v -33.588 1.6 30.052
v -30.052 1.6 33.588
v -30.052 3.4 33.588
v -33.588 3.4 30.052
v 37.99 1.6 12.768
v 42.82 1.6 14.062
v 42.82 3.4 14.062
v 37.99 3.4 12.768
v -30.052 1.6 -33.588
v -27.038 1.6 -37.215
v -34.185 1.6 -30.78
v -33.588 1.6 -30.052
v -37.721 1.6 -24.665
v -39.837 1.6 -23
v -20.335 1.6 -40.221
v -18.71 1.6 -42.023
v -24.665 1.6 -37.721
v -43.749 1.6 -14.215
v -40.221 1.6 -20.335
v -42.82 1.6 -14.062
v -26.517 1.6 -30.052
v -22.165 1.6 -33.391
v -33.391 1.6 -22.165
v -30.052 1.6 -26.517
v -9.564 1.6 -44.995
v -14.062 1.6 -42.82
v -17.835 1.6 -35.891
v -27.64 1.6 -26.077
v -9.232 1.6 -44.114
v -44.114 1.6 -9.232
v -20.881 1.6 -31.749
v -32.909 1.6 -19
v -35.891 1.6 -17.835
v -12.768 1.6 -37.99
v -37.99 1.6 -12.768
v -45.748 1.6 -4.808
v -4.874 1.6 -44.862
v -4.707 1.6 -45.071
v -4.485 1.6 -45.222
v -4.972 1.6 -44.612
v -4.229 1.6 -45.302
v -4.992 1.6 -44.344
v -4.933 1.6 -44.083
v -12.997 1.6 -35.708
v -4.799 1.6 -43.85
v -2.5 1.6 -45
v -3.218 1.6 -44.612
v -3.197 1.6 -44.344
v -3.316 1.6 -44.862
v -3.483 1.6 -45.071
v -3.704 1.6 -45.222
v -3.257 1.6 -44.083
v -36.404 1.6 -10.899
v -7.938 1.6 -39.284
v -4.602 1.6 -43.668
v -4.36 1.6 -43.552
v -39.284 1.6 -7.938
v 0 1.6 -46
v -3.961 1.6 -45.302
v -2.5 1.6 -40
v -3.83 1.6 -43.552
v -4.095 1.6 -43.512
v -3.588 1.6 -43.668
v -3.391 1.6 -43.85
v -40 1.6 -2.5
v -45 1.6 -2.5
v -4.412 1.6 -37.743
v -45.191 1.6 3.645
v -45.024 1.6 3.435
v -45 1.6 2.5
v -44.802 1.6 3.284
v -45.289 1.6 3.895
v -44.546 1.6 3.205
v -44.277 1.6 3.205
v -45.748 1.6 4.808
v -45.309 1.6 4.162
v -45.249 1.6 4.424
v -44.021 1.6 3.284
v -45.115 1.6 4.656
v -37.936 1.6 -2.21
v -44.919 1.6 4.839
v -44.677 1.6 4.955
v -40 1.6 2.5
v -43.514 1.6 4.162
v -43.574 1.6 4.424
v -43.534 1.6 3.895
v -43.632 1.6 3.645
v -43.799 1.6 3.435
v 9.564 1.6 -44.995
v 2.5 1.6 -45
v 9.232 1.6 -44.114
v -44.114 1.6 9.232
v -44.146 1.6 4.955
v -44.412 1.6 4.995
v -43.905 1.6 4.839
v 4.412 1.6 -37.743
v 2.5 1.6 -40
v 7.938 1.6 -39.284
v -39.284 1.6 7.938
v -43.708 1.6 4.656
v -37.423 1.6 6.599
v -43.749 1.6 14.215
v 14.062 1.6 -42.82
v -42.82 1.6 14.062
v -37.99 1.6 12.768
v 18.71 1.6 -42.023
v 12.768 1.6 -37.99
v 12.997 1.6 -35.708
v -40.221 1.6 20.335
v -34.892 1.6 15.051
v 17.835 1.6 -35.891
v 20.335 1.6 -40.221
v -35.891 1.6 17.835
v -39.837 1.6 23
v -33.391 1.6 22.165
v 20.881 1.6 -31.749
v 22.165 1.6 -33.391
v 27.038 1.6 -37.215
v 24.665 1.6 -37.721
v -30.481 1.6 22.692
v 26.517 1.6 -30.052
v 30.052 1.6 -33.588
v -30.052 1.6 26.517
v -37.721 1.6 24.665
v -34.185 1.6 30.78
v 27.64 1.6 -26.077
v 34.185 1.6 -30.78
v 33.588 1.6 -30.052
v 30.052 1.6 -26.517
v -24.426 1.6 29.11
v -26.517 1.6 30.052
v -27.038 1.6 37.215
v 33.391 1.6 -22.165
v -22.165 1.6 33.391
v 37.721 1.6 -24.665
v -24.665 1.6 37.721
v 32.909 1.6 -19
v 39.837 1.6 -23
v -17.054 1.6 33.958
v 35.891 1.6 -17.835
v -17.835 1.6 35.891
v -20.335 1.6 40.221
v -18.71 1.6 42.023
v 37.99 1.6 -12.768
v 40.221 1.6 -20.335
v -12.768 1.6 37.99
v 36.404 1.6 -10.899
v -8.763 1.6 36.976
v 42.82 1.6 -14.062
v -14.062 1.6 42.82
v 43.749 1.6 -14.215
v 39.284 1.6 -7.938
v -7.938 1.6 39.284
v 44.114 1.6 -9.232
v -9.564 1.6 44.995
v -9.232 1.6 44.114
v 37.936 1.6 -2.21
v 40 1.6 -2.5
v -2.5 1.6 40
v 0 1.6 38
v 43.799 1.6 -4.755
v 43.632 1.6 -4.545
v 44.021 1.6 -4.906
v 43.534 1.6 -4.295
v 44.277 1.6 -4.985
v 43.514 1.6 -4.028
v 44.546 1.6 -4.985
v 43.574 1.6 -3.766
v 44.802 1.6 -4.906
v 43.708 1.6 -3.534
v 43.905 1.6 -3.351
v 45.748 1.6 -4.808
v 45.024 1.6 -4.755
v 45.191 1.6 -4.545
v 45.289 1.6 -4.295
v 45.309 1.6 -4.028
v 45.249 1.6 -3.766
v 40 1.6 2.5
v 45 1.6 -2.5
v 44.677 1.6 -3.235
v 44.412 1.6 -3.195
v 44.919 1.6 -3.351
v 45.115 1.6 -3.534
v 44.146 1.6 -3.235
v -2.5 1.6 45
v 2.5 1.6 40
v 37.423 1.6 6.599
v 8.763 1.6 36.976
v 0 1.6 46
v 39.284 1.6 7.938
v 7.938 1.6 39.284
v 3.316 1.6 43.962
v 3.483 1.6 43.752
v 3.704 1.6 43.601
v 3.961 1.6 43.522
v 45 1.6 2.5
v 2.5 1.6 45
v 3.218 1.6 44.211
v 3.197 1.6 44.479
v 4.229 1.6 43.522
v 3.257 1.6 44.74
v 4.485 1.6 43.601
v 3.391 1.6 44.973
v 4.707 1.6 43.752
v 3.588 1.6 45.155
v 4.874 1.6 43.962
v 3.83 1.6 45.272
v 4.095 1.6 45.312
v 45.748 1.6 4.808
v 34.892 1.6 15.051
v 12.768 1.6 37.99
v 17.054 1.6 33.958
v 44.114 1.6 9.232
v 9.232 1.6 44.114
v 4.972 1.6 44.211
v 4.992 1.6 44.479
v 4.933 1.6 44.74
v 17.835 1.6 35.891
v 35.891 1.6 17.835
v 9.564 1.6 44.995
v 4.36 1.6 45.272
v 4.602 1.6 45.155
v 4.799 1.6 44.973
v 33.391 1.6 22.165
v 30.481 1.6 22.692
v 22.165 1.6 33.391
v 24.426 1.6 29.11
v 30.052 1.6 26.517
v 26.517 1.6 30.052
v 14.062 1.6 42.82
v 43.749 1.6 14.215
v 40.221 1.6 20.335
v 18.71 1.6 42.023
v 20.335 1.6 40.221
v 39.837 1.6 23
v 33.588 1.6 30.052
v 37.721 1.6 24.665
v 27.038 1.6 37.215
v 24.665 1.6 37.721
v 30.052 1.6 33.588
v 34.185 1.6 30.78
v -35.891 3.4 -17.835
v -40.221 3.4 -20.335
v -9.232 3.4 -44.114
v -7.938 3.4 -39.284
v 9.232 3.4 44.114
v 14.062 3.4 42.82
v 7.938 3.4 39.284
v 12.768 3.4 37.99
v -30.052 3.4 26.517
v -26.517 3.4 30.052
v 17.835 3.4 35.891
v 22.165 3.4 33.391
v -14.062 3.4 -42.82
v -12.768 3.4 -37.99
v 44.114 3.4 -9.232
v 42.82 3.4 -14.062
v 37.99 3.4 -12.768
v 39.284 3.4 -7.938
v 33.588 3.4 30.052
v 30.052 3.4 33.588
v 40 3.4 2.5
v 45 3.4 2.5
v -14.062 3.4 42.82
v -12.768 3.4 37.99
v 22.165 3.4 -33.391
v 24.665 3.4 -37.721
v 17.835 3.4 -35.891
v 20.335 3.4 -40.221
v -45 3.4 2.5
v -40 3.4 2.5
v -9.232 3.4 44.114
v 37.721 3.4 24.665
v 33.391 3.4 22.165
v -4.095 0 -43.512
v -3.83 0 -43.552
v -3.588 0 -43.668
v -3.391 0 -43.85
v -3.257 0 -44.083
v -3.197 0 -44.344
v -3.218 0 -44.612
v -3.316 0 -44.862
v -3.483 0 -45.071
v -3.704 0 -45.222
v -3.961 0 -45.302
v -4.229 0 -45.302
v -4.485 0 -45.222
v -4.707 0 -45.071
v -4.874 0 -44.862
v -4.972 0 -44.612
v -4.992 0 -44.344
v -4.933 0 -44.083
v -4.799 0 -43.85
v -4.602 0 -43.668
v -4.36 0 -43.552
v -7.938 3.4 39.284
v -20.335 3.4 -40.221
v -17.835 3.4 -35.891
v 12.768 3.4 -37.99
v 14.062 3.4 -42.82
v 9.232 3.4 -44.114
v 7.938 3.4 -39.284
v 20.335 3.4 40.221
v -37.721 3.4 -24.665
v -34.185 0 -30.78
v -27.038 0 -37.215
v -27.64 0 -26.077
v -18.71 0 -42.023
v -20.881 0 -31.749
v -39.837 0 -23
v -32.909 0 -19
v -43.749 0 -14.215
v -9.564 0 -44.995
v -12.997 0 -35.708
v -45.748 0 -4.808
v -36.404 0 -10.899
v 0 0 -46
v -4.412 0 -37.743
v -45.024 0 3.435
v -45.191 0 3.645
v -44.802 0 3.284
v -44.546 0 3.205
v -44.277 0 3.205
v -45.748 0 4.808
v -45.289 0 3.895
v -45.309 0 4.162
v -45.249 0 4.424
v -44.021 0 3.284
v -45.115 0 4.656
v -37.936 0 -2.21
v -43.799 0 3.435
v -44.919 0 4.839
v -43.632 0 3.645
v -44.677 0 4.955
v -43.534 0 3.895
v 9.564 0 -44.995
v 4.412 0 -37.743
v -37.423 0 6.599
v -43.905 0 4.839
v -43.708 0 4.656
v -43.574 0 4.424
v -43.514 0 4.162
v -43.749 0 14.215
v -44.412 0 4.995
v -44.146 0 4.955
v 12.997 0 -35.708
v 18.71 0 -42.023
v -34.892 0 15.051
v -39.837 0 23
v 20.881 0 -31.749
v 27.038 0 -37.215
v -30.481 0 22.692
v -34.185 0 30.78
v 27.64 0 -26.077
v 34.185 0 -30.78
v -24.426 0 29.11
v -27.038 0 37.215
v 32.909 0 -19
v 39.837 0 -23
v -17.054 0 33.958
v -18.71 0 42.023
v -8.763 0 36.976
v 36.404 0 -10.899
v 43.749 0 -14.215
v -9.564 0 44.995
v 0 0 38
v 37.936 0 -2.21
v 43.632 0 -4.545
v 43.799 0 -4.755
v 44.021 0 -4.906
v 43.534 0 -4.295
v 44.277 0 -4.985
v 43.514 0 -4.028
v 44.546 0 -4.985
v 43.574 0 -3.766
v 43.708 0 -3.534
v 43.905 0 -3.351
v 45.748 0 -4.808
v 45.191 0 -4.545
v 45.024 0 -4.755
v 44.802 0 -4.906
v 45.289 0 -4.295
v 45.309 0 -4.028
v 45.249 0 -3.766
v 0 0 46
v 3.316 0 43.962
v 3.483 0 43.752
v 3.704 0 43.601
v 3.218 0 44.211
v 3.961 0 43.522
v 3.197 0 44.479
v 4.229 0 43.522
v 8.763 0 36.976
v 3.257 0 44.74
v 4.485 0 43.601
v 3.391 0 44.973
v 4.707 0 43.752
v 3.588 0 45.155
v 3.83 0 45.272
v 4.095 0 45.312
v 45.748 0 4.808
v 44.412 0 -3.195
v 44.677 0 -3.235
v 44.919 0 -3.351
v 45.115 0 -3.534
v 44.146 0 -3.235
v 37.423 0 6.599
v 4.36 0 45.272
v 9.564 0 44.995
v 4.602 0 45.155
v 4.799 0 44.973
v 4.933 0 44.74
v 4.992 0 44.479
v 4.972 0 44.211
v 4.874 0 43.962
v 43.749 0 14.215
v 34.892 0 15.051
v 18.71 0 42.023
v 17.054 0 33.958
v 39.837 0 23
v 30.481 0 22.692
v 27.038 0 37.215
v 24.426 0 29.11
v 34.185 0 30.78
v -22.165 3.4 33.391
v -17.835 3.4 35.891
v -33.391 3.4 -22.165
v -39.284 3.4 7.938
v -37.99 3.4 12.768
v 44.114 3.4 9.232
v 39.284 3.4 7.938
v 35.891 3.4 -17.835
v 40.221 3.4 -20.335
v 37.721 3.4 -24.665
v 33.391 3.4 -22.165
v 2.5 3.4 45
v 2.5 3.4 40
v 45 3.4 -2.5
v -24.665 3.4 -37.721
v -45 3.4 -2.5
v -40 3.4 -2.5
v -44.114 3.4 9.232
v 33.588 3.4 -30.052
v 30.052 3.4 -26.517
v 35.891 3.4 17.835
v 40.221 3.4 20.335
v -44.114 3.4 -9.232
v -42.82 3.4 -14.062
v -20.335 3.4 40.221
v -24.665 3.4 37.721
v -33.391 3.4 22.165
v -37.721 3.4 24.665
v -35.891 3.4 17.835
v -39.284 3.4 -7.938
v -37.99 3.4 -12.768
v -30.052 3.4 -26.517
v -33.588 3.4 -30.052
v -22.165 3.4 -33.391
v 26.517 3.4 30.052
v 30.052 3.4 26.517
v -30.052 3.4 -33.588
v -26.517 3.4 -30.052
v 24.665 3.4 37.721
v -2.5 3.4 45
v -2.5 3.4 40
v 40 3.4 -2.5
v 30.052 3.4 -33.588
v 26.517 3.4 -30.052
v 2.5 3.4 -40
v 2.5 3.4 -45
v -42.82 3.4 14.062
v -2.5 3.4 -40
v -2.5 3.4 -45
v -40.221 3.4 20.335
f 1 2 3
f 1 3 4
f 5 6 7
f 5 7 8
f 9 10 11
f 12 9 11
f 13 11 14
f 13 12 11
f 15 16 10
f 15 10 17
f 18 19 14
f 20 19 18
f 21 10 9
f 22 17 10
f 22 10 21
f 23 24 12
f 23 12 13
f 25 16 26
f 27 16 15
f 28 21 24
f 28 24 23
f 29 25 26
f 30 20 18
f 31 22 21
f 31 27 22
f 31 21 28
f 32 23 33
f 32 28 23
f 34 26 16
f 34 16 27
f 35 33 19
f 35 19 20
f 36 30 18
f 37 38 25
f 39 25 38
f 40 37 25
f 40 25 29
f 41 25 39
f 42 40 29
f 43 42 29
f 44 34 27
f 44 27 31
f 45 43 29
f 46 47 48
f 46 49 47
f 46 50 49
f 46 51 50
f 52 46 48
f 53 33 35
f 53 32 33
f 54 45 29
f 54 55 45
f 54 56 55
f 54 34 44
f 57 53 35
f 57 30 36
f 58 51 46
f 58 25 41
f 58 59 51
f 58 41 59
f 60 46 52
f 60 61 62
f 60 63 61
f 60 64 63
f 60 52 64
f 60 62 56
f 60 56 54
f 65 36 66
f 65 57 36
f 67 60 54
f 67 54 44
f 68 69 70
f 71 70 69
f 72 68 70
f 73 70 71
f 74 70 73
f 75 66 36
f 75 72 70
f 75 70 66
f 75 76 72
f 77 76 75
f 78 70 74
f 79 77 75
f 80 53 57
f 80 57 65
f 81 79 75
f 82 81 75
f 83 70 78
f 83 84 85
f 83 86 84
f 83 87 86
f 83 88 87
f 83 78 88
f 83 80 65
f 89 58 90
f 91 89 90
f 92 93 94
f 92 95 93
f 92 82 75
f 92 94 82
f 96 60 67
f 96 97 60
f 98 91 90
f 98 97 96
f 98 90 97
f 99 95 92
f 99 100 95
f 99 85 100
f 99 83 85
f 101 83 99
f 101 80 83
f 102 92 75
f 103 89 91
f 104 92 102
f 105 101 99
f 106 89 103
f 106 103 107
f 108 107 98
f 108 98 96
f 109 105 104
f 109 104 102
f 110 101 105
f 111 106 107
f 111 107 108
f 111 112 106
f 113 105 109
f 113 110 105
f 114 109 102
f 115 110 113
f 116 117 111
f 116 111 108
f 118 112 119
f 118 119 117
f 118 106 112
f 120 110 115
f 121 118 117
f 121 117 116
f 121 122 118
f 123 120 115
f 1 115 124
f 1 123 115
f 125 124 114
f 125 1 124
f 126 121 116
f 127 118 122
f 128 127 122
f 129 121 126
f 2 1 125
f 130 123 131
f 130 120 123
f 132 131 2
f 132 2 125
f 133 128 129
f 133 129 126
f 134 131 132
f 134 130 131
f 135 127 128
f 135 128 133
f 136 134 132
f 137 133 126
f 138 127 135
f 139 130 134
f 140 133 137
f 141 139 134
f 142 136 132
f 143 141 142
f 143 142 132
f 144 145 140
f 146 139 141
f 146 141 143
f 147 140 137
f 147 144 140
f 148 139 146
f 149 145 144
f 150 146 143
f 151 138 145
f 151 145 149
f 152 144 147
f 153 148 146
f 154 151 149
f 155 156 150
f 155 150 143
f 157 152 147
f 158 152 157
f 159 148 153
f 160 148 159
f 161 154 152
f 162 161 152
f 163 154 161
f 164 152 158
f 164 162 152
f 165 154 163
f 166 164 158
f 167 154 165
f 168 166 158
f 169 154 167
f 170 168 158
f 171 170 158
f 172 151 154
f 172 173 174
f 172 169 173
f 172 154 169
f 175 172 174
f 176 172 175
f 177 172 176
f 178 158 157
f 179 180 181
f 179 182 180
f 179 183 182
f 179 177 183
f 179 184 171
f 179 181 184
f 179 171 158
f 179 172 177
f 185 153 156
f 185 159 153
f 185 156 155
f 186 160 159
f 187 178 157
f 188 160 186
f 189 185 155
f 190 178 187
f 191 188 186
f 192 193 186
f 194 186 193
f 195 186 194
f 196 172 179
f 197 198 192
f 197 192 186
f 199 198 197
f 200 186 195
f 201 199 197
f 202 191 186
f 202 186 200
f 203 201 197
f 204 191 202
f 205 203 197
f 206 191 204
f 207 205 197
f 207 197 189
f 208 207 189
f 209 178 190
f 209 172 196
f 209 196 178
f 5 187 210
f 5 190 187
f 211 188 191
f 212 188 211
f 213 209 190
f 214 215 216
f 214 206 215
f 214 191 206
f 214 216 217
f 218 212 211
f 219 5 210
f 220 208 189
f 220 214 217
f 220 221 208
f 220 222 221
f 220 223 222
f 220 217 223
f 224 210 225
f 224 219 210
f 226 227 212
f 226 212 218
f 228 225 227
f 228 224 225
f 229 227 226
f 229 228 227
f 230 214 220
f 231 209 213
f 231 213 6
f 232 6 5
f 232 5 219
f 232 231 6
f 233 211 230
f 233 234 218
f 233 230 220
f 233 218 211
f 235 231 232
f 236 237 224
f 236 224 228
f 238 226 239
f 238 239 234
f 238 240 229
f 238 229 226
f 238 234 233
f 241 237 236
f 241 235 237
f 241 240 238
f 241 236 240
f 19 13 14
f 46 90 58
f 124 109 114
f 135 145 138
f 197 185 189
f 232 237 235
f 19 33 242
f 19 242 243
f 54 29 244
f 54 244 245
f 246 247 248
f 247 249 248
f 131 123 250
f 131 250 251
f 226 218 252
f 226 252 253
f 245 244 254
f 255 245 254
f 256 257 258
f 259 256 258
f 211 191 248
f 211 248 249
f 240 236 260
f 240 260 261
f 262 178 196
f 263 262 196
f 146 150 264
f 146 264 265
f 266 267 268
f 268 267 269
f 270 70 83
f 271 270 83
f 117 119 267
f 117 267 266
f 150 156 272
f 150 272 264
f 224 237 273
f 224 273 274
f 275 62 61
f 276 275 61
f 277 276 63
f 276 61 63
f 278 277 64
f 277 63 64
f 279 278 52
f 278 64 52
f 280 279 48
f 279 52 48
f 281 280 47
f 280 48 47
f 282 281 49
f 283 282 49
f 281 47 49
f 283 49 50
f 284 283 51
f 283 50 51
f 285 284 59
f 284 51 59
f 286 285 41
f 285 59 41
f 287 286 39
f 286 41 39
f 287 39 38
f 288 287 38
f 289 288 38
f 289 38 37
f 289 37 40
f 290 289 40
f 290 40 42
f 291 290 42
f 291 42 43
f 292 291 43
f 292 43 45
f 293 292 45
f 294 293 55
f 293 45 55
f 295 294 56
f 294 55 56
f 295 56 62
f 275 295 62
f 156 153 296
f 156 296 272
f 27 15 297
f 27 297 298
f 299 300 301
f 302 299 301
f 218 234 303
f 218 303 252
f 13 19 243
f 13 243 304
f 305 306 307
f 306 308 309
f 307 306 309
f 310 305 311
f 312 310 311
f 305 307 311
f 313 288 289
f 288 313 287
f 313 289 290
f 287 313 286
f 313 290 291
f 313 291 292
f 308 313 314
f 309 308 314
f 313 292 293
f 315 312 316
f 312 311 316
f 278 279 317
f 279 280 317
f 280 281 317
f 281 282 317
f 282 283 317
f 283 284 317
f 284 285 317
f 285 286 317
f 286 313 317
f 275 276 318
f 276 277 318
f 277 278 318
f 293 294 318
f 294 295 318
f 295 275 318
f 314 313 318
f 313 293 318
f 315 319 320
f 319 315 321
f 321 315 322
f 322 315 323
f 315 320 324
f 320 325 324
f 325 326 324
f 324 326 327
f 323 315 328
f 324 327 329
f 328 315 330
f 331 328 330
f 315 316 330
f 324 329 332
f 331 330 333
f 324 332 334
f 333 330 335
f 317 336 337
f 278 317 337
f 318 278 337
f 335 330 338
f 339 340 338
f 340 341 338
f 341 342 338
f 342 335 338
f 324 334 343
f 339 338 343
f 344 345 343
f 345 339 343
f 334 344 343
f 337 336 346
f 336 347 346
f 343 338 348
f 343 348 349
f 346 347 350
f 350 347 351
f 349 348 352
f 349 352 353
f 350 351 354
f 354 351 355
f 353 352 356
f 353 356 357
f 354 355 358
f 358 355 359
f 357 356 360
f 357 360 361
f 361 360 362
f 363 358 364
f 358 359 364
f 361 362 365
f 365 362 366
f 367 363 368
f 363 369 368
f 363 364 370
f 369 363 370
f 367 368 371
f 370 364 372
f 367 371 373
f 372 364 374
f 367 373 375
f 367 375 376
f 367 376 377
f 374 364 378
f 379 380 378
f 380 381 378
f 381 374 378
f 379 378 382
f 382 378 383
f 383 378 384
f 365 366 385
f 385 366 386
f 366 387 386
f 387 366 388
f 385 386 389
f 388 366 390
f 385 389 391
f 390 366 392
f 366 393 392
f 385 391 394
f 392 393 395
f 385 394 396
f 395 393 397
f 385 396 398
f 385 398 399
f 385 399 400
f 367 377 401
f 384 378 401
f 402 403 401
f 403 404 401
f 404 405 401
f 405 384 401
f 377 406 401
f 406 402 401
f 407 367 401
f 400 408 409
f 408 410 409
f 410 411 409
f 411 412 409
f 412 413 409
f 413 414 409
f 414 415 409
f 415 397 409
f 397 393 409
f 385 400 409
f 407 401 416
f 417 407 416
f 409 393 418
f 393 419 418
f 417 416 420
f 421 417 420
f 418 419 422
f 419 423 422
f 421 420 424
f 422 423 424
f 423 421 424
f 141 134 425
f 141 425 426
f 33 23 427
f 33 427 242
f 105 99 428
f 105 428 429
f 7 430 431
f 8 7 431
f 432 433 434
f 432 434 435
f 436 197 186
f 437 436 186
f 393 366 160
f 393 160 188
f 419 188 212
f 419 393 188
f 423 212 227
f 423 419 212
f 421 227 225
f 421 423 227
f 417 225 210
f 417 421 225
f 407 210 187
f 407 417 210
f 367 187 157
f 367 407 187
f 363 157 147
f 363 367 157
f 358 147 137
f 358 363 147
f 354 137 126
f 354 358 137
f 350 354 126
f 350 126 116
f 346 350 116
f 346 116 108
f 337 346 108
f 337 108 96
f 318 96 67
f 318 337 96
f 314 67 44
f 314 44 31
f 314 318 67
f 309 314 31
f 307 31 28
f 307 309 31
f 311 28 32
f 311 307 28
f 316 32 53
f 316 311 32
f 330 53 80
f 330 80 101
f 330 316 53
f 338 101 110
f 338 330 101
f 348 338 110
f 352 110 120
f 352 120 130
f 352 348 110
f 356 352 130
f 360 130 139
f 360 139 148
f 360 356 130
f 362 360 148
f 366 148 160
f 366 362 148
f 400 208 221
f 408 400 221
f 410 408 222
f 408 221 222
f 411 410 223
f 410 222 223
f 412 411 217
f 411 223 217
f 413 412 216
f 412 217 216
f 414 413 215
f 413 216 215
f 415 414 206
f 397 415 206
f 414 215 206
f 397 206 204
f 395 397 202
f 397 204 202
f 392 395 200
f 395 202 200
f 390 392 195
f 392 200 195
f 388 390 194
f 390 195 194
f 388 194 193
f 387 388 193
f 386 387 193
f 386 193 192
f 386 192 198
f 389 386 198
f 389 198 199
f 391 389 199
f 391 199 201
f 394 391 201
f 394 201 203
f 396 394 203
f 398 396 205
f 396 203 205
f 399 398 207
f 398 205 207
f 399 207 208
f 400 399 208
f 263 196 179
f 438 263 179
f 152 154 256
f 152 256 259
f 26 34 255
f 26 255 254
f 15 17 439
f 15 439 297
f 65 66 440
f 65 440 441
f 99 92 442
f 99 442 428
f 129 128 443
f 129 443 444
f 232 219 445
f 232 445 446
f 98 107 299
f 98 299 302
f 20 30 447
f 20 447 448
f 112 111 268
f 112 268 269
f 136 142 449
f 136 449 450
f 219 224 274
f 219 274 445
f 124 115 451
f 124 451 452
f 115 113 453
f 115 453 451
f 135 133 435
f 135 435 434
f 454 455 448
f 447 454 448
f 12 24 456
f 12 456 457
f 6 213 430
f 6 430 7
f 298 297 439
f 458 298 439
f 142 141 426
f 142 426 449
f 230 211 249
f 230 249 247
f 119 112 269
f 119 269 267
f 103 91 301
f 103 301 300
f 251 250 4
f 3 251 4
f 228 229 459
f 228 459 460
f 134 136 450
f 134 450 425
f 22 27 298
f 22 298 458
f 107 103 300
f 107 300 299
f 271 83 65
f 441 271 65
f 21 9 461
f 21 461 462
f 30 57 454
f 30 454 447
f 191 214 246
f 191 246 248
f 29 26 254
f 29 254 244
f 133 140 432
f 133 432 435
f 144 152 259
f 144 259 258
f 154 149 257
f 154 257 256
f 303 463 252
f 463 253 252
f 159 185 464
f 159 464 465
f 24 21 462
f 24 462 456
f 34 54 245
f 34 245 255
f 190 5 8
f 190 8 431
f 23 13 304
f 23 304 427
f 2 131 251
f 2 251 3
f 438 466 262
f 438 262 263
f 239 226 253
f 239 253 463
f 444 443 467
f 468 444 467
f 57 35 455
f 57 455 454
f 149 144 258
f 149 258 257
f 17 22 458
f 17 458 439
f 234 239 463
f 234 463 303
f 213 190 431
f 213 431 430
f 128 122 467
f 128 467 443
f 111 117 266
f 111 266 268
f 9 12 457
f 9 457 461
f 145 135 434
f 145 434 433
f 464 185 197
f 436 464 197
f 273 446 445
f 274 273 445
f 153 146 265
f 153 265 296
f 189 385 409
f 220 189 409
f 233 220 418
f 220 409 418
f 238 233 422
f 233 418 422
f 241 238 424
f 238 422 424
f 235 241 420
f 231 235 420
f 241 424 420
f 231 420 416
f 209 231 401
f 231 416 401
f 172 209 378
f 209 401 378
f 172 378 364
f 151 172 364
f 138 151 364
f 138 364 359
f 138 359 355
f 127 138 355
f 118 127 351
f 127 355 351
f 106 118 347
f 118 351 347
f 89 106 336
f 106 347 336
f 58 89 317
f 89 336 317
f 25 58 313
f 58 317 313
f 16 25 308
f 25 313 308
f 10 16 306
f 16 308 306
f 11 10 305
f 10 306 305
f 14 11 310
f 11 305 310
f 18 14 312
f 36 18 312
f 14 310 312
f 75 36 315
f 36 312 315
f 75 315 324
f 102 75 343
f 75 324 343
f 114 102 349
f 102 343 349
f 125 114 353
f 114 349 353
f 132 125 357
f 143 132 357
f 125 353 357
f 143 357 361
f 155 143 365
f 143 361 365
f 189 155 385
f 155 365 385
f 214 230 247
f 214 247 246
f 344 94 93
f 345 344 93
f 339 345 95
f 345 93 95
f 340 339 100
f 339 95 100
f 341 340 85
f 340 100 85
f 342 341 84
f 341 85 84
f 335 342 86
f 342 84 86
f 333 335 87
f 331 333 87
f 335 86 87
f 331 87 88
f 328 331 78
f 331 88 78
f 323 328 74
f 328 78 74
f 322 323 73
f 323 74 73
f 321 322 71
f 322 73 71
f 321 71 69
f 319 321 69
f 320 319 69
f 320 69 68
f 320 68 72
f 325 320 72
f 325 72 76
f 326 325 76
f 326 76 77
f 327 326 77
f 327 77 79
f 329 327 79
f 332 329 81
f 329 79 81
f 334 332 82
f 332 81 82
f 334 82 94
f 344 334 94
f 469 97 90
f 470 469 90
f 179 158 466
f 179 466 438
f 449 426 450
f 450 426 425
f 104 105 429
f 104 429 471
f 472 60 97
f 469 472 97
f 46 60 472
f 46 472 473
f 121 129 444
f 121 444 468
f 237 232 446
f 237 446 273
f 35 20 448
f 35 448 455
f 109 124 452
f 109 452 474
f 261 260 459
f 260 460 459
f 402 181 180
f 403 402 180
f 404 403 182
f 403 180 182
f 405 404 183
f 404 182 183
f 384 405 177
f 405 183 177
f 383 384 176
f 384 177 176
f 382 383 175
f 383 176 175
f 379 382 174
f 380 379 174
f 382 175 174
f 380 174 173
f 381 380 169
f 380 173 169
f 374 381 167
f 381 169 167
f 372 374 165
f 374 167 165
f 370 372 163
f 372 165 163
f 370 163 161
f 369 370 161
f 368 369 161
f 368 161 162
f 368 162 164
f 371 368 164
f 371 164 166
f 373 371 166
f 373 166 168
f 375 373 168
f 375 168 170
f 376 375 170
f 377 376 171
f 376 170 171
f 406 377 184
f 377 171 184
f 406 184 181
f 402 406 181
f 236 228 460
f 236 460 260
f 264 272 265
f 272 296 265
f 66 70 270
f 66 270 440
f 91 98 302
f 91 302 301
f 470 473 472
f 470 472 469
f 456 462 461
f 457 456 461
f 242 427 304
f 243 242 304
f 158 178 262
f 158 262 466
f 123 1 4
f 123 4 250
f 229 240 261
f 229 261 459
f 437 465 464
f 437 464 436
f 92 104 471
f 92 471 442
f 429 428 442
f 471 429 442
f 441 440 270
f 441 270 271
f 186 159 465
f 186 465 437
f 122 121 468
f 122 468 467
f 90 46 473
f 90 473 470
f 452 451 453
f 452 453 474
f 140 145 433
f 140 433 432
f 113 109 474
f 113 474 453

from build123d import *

# Parameters (mm, degrees)
ESQUISSE1_R             = 46
ESQUISSE1_R_2           = 38
BOSS_EXTRU_1_DEPTH      = 1.6
ESQUISSE2_R             = 0.9
ENL_V_MAT_EXTRU_1_DEPTH = 1.6
ESQUISSE3_W             = 5
ESQUISSE3_H             = 5
BOSS_EXTRU_2_DEPTH      = 1.8


with BuildPart() as part:
    # Esquisse1 → Boss.-Extru.1 (new body)
    with BuildSketch(Plane(origin=(0, 0, 0), x_dir=(1, 0, 0), z_dir=(0, 1, 0))):
        with Locations(Location((0, 0, 0), (0, 0, 270))):
            Circle(ESQUISSE1_R)
        with Locations(Location((0, 0, 0), (0, 0, 270))):
            Circle(ESQUISSE1_R_2, mode=Mode.SUBTRACT)
    extrude(amount=BOSS_EXTRU_1_DEPTH)

    # Esquisse2 → Enlèv. mat.-Extru.1 (cut)
    with BuildSketch(Plane(origin=(0, 1.6, 0), x_dir=(1, 0, 0), z_dir=(0, 1, 0))):
        with Locations(Location((-4.094938915, 44.411614194, 0), (0, 0, 270))):
            Circle(ESQUISSE2_R)
        with Locations(Location((44.411614194, 4.094938915, 0), (0, 0, 270))):
            Circle(ESQUISSE2_R)
        with Locations(Location((4.094938915, -44.411614194, 0), (0, 0, 270))):
            Circle(ESQUISSE2_R)
        with Locations(Location((-44.411614194, -4.094938915, 0), (0, 0, 270))):
            Circle(ESQUISSE2_R)
    extrude(amount=-ENL_V_MAT_EXTRU_1_DEPTH, mode=Mode.SUBTRACT)

    # Esquisse3 → Boss.-Extru.2 (add)
    with BuildSketch(Plane(origin=(0, 1.6, 0), x_dir=(1, 0, 0), z_dir=(0, 1, 0))):
        with Locations((0, 42.5)):
            Rectangle(ESQUISSE3_W, ESQUISSE3_H)
        Polygon((9.232042464, 44.113709796), (14.061671595, 42.81961457), (12.76757637, 37.989985439), (7.937947238, 39.284080664), align=None)
        Polygon((20.334936491, 40.22114317), (24.665063509, 37.72114317), (22.165063509, 33.391016151), (17.834936491, 35.891016151), align=None)
        Polygon((30.0520382, 33.587572106), (33.587572106, 30.0520382), (30.0520382, 26.516504294), (26.516504294, 30.0520382), align=None)
        Polygon((37.72114317, 24.665063509), (40.22114317, 20.334936491), (35.891016151, 17.834936491), (33.391016151, 22.165063509), align=None)
        Polygon((42.81961457, 14.061671595), (44.113709796, 9.232042464), (39.284080664, 7.937947238), (37.989985439, 12.76757637), align=None)
        with Locations((42.5, 0)):
            Rectangle(ESQUISSE3_W, ESQUISSE3_H)
        Polygon((44.113709796, -9.232042464), (42.81961457, -14.061671595), (37.989985439, -12.76757637), (39.284080664, -7.937947238), align=None)
        Polygon((40.22114317, -20.334936491), (37.72114317, -24.665063509), (33.391016151, -22.165063509), (35.891016151, -17.834936491), align=None)
        Polygon((33.587572106, -30.0520382), (30.0520382, -33.587572106), (26.516504294, -30.0520382), (30.0520382, -26.516504294), align=None)
        Polygon((24.665063509, -37.72114317), (20.334936491, -40.22114317), (17.834936491, -35.891016151), (22.165063509, -33.391016151), align=None)
        Polygon((14.061671595, -42.81961457), (9.232042464, -44.113709796), (7.937947238, -39.284080664), (12.76757637, -37.989985439), align=None)
        with Locations((0, -42.5)):
            Rectangle(ESQUISSE3_W, ESQUISSE3_H)
        Polygon((-9.232042464, -44.113709796), (-14.061671595, -42.81961457), (-12.76757637, -37.989985439), (-7.937947238, -39.284080664), align=None)
        Polygon((-20.334936491, -40.22114317), (-24.665063509, -37.72114317), (-22.165063509, -33.391016151), (-17.834936491, -35.891016151), align=None)
        Polygon((-30.0520382, -33.587572106), (-33.587572106, -30.0520382), (-30.0520382, -26.516504294), (-26.516504294, -30.0520382), align=None)
        Polygon((-37.72114317, -24.665063509), (-40.22114317, -20.334936491), (-35.891016151, -17.834936491), (-33.391016151, -22.165063509), align=None)
        Polygon((-42.81961457, -14.061671595), (-44.113709796, -9.232042464), (-39.284080664, -7.937947238), (-37.989985439, -12.76757637), align=None)
        with Locations((-42.5, 0)):
            Rectangle(ESQUISSE3_W, ESQUISSE3_H)
        Polygon((-44.113709796, 9.232042464), (-42.81961457, 14.061671595), (-37.989985439, 12.76757637), (-39.284080664, 7.937947238), align=None)
        Polygon((-40.22114317, 20.334936491), (-37.72114317, 24.665063509), (-33.391016151, 22.165063509), (-35.891016151, 17.834936491), align=None)
        Polygon((-33.587572106, 30.0520382), (-30.0520382, 33.587572106), (-26.516504294, 30.0520382), (-30.0520382, 26.516504294), align=None)
        Polygon((-24.665063509, 37.72114317), (-20.334936491, 40.22114317), (-17.834936491, 35.891016151), (-22.165063509, 33.391016151), align=None)
        Polygon((-14.061671595, 42.81961457), (-9.232042464, 44.113709796), (-7.937947238, 39.284080664), (-12.76757637, 37.989985439), align=None)
    extrude(amount=BOSS_EXTRU_2_DEPTH)


solid = part.part
